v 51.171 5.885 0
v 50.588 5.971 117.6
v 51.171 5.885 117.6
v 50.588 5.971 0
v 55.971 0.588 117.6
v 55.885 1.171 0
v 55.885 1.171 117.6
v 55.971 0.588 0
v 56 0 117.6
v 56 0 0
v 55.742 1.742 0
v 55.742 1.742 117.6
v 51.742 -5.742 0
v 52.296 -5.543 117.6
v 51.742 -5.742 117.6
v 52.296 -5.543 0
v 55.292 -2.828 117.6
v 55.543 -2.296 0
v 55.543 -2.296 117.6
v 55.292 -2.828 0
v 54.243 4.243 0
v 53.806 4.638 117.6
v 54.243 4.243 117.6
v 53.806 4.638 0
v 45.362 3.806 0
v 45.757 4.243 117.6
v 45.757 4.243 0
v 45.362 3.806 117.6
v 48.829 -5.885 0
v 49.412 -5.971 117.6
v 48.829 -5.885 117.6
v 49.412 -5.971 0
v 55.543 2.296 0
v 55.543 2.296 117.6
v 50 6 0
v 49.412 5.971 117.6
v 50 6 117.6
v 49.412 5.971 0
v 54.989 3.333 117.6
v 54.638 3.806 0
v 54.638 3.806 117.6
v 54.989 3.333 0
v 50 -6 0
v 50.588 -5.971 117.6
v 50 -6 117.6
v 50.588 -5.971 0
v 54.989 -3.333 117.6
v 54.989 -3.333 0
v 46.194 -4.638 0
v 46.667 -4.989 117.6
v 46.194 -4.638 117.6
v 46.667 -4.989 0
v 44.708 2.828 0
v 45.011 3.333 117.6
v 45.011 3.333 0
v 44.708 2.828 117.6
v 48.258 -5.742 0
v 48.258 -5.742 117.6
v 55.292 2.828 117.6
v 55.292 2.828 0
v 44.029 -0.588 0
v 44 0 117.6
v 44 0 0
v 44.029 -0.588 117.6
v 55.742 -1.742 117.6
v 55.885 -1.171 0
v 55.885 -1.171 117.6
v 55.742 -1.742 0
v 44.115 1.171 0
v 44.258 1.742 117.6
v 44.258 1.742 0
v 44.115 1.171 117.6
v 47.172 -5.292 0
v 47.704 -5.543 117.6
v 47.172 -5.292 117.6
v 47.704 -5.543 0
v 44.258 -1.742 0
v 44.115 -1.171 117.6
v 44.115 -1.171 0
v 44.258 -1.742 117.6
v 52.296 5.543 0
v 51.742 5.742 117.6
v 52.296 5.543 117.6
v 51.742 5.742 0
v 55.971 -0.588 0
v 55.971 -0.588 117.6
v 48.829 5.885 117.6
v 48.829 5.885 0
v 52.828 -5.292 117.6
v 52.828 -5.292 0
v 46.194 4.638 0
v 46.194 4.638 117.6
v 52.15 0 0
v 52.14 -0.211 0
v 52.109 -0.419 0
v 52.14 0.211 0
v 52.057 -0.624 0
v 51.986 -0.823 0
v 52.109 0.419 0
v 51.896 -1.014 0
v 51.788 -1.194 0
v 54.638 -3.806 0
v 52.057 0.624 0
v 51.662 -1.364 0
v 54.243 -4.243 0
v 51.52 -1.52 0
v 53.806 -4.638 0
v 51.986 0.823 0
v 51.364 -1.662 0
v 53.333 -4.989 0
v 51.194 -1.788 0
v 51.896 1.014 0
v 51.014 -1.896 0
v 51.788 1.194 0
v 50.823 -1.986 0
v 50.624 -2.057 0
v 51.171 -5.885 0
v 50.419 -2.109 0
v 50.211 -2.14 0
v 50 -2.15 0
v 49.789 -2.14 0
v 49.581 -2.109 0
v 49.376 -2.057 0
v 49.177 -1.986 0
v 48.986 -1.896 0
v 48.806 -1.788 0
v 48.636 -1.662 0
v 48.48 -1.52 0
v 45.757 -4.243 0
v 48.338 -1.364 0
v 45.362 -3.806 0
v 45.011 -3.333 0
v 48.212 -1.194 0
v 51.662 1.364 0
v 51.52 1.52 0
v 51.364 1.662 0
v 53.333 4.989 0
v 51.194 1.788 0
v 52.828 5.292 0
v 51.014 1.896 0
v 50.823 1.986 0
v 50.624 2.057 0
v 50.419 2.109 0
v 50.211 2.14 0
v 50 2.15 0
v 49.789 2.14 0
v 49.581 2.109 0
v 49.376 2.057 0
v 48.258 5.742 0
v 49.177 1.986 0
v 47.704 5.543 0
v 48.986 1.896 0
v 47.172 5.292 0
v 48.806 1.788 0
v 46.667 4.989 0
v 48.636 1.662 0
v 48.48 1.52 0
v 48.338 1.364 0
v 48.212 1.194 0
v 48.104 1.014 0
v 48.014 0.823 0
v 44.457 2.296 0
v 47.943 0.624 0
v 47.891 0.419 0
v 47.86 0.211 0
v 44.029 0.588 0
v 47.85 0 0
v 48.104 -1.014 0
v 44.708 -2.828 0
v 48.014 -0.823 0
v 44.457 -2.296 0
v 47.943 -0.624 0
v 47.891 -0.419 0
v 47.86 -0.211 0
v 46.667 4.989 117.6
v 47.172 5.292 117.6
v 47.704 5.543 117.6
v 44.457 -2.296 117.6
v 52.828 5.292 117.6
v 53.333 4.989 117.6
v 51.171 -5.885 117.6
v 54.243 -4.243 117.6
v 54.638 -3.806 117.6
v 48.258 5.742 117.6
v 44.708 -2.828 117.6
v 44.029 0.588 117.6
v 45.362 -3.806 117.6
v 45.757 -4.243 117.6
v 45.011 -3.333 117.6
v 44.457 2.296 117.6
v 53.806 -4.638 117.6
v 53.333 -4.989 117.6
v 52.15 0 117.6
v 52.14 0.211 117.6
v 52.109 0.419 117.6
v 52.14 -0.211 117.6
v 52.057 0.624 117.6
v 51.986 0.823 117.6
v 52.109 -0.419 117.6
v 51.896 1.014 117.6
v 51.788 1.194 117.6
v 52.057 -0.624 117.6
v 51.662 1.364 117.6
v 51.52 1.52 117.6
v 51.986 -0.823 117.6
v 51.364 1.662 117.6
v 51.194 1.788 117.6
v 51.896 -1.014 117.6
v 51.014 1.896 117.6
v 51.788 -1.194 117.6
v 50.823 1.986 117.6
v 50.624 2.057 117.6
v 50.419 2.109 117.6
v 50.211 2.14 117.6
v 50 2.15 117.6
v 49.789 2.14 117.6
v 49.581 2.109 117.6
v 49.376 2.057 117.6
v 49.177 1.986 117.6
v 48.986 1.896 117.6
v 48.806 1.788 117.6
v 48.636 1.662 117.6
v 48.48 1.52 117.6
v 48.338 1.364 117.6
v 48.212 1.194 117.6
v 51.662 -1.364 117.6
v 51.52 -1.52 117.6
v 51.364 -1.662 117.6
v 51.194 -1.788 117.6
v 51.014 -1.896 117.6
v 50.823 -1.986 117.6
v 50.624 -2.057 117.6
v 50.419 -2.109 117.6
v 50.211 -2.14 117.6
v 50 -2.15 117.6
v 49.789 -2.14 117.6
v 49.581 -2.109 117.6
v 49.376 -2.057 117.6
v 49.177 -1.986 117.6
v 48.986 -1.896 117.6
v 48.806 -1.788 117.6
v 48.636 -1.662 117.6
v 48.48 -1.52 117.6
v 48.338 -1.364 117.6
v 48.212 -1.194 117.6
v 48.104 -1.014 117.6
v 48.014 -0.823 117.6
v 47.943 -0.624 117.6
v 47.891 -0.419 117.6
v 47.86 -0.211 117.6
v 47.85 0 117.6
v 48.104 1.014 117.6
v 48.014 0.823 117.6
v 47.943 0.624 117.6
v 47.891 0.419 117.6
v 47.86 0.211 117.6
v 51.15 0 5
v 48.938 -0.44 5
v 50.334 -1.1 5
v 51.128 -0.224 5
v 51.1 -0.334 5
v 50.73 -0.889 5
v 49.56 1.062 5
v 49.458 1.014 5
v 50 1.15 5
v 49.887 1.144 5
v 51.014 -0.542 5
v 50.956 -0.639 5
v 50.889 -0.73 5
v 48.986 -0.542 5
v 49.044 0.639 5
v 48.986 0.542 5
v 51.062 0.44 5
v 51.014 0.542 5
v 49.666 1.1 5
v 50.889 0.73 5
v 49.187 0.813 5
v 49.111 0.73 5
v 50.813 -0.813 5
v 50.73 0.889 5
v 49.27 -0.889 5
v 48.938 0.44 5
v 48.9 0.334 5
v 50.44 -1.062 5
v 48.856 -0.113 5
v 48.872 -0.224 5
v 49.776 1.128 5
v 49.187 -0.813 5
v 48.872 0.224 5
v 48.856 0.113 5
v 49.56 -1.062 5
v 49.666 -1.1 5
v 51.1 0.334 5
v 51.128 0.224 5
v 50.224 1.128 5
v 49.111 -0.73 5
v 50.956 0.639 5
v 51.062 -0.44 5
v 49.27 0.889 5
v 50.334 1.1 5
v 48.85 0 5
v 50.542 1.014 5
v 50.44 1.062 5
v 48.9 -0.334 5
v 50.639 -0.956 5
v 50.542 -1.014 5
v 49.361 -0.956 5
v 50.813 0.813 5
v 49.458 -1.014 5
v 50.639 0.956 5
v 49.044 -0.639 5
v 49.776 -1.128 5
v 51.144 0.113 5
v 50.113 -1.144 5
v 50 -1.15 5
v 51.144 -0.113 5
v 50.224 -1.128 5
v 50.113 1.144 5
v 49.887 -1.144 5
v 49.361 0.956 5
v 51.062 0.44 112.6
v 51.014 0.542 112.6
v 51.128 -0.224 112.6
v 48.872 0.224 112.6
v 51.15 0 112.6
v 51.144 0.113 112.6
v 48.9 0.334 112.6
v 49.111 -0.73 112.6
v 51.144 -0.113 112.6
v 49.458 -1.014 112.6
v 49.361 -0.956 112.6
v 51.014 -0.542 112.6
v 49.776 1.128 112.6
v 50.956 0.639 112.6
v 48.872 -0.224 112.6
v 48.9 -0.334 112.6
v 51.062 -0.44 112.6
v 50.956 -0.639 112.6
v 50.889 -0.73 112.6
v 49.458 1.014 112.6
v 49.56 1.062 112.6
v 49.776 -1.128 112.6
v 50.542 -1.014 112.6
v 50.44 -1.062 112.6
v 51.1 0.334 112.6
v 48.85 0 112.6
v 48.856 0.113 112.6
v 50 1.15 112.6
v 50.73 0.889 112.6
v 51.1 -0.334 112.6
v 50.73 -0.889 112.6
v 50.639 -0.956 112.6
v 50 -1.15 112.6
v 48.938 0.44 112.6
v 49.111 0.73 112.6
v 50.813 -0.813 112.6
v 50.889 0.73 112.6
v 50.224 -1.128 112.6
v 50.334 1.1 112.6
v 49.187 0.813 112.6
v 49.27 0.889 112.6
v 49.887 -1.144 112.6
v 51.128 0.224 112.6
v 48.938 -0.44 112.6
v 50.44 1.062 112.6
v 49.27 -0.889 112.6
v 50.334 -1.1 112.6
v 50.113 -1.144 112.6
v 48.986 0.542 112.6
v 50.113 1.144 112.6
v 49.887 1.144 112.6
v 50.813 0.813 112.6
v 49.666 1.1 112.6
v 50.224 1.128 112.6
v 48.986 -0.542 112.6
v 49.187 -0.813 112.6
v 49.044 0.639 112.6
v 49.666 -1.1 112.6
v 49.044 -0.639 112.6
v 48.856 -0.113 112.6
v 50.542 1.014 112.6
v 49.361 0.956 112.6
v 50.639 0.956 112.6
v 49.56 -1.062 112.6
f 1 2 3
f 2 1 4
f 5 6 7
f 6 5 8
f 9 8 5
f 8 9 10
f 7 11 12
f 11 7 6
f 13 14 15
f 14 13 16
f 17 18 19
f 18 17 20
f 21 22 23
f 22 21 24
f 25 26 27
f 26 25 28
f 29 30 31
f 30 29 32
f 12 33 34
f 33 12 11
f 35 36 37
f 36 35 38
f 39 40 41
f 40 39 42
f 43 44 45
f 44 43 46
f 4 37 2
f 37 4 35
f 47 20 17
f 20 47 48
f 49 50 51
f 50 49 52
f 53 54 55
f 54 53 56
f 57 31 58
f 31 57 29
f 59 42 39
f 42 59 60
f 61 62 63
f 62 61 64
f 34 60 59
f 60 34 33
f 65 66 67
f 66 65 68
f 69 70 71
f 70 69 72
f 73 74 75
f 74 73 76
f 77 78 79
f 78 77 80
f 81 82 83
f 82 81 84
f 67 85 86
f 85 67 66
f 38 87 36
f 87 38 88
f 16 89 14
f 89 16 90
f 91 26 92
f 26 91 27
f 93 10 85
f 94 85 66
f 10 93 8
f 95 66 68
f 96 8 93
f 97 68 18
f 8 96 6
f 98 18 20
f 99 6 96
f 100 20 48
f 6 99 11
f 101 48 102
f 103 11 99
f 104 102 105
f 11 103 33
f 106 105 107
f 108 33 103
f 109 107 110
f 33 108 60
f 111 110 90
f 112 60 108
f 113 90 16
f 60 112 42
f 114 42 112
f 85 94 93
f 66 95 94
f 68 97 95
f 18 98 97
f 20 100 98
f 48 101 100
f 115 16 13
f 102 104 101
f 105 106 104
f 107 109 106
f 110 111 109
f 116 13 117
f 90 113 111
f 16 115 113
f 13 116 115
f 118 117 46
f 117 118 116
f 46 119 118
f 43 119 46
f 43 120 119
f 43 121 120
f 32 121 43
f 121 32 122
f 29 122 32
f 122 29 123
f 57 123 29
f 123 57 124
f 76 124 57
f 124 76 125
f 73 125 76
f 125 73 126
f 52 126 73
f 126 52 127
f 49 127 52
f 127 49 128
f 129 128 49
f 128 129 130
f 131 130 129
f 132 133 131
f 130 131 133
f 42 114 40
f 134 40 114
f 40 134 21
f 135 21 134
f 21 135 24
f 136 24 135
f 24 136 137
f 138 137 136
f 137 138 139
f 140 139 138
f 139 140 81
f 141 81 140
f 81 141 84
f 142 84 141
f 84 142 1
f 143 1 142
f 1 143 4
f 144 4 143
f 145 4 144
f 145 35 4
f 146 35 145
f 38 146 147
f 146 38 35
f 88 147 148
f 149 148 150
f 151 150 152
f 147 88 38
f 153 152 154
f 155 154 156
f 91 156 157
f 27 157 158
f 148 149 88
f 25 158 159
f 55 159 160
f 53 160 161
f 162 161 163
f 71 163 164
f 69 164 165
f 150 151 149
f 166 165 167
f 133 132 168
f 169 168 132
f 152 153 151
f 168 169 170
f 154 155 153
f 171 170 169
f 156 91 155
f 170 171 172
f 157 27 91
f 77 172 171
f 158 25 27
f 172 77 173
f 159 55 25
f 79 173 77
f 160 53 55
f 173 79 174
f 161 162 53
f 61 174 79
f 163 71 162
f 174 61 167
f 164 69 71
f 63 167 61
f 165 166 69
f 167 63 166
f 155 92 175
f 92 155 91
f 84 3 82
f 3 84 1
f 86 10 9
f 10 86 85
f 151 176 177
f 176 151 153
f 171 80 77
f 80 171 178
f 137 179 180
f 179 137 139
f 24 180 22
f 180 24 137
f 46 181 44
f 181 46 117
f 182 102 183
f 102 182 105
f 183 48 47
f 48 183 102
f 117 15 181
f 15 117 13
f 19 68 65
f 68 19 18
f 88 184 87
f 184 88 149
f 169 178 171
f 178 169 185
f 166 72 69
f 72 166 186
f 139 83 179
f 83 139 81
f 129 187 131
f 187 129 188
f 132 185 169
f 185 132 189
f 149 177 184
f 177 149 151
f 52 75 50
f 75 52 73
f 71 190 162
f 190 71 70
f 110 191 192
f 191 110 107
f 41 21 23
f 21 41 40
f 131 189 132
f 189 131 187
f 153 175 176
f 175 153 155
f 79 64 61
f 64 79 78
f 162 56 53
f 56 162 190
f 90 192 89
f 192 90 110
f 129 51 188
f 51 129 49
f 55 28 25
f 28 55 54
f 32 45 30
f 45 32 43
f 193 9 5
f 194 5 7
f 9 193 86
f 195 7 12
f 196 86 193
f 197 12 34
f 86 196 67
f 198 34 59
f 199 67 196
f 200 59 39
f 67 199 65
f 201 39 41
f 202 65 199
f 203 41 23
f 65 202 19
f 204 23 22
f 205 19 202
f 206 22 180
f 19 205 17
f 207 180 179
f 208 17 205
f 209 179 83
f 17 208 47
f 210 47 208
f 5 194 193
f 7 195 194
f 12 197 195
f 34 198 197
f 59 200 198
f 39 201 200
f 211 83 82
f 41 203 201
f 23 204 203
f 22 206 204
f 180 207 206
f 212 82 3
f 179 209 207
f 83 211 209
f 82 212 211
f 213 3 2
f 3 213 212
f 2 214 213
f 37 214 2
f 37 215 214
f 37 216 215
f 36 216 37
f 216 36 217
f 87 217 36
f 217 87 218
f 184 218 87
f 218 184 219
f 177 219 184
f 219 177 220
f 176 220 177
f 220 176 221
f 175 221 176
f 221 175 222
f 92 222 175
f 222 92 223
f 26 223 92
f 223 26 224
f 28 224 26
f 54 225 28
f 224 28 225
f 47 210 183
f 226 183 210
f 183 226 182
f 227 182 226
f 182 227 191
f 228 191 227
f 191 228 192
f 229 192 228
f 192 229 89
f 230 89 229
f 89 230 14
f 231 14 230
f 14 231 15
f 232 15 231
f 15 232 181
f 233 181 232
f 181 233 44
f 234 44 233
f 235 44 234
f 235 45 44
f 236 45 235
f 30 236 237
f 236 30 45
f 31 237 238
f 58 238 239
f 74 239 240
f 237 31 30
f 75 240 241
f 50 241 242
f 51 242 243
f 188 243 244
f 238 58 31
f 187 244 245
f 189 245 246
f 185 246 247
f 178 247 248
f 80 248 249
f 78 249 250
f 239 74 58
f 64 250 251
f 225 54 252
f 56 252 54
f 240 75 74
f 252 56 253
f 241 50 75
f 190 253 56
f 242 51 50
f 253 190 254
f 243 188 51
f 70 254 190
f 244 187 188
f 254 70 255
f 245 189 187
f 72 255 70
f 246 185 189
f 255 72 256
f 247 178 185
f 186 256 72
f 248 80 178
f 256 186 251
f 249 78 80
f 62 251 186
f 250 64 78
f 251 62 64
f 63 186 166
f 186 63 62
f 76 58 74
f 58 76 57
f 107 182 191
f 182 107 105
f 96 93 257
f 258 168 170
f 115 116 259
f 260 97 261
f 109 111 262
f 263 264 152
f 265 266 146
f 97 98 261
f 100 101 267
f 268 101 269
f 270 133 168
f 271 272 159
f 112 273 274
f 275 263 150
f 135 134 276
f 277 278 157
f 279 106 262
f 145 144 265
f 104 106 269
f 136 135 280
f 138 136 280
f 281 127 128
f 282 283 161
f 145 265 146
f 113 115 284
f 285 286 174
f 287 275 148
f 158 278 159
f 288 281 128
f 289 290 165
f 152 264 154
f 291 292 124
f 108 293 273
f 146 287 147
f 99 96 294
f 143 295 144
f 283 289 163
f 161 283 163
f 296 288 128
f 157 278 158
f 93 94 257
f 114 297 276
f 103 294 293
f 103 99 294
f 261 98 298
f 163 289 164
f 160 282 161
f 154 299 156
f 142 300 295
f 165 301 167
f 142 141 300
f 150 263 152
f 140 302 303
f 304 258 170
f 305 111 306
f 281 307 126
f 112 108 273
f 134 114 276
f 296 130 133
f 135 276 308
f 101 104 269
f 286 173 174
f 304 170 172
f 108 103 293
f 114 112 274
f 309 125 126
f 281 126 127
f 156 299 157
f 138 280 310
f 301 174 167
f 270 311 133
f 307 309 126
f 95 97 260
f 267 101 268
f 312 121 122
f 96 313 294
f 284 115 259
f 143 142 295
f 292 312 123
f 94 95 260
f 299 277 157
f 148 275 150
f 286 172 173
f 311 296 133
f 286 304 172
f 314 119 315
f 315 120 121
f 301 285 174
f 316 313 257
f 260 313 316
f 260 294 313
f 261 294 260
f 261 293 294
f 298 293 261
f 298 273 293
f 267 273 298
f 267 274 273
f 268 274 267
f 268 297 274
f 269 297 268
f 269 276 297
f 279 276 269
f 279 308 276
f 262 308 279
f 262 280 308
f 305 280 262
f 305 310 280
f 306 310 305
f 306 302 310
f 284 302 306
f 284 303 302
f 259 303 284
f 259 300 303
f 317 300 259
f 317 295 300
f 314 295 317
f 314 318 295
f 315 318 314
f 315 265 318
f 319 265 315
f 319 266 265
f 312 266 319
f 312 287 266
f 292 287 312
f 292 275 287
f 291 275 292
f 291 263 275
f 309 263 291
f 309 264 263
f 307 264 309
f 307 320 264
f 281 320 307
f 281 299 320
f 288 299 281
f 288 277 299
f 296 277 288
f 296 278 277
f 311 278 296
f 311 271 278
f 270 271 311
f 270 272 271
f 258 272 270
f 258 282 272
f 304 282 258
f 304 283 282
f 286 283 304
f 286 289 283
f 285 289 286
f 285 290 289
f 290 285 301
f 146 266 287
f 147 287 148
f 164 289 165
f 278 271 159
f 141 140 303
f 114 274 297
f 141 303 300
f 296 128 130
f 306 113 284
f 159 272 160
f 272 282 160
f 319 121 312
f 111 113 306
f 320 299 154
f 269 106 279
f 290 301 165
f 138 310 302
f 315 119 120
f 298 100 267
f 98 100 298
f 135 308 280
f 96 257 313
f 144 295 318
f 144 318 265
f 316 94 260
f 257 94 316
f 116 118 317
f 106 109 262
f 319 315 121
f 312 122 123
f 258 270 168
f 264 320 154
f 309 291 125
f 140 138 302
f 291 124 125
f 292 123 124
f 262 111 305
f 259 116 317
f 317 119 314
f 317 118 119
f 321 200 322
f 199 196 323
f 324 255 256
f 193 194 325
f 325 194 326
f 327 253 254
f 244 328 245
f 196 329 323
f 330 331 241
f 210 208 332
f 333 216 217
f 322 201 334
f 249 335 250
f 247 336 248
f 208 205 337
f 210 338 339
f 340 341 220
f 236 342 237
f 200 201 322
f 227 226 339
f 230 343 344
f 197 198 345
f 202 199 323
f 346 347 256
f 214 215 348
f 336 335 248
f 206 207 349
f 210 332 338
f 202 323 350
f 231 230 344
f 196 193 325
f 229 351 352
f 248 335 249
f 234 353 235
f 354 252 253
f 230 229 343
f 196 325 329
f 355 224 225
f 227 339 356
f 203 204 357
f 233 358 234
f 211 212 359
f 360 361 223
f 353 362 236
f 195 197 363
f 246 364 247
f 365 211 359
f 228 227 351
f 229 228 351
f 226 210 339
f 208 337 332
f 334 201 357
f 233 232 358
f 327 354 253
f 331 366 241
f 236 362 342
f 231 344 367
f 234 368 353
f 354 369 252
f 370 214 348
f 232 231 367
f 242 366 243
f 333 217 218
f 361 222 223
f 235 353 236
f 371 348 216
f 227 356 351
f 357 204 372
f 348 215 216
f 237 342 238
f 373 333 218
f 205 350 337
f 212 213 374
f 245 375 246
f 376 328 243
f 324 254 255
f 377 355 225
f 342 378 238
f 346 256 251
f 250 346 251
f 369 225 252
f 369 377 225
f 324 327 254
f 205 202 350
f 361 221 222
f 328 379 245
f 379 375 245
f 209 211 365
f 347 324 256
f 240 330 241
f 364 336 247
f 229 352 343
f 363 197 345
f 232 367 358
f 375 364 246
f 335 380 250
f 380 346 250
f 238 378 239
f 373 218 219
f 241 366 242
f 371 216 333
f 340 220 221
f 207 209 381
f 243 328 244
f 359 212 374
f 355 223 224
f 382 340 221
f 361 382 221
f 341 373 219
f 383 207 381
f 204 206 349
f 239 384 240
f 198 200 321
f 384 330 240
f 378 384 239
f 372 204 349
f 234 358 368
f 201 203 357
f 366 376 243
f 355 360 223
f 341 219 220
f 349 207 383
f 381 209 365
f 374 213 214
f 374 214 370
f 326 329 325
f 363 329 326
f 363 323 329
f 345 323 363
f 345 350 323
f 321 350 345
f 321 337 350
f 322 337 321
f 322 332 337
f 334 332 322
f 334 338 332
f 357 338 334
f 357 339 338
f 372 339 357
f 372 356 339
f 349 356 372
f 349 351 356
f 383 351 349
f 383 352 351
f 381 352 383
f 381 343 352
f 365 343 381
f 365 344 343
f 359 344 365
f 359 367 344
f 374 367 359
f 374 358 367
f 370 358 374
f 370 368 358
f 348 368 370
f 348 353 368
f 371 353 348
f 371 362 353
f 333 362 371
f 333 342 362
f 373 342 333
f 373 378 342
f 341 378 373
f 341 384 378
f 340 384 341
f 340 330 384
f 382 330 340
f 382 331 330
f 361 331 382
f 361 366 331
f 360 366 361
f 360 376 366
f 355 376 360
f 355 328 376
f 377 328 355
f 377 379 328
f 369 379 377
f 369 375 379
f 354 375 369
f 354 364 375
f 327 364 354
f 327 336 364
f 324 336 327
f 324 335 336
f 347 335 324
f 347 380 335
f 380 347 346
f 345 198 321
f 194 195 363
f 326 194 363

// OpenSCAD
/*
 * Hull: 4,4mm
 * Avstand, ytterkant til ytterkant: 134mm 
 * Avstand, sentrum til sentrum: 134-4,4=129,6mm
 * Dybde: 16,2mm
 */

$fn = $preview ? 16 : 64;

hole_d = 4.4;           // In door
screw_d = 4;            // M4
screw_d_clearance = 0.2;   
holes_distance=129.6;   // Between the two
screw_length=16.2;      // Through door
back_disc_d = 16;
back_disc_h = 2;
sprout=10;
screw_sprout_clearance=2;
feste_clearence=.3;

handle_height = 40;
handle_d = 12;
handle_length = holes_distance-handle_d;


// hva skal tegnes?
tegne_feste = false;
tegne_utstikker = false;
tegne_handtak = true;

/* feste */
if (tegne_feste) {
    cylinder(h=back_disc_h, d=back_disc_d);
    cylinder(h=screw_length+back_disc_h+sprout, d=screw_d);
}

/* utstikker */
if (tegne_utstikker) {
    translate([30,0,0]) {
        difference() {
            cylinder(h=handle_height, d=handle_d);
            cylinder(h=sprout+screw_sprout_clearance, d=screw_d+screw_d_clearance);
        }
        translate([handle_d/2,0,handle_height]) {
            rotate([90,270,0]) rotate_extrude(convexity = 10, angle = 90)
                translate([handle_d/2, 0, 0])
                    circle(r = handle_d/2);
            translate([0,0,handle_d/2])
                rotate([0,90,0])
                    cylinder(d1=screw_d, d2=screw_d/2, h=sprout/2);
        }
    }
}
/* håndtak */
if (tegne_handtak) {
    translate([50,0,0]) {
        difference() {
            cylinder(h=handle_length, d=handle_d);
            cylinder(d1=screw_d+feste_clearence, d2=screw_d/2+feste_clearence, h=sprout/2);
            translate([0,0,handle_length-sprout/2])
                cylinder(d1=screw_d/2+feste_clearence, d2=screw_d+feste_clearence, h=sprout/2);
        }
    }
}
